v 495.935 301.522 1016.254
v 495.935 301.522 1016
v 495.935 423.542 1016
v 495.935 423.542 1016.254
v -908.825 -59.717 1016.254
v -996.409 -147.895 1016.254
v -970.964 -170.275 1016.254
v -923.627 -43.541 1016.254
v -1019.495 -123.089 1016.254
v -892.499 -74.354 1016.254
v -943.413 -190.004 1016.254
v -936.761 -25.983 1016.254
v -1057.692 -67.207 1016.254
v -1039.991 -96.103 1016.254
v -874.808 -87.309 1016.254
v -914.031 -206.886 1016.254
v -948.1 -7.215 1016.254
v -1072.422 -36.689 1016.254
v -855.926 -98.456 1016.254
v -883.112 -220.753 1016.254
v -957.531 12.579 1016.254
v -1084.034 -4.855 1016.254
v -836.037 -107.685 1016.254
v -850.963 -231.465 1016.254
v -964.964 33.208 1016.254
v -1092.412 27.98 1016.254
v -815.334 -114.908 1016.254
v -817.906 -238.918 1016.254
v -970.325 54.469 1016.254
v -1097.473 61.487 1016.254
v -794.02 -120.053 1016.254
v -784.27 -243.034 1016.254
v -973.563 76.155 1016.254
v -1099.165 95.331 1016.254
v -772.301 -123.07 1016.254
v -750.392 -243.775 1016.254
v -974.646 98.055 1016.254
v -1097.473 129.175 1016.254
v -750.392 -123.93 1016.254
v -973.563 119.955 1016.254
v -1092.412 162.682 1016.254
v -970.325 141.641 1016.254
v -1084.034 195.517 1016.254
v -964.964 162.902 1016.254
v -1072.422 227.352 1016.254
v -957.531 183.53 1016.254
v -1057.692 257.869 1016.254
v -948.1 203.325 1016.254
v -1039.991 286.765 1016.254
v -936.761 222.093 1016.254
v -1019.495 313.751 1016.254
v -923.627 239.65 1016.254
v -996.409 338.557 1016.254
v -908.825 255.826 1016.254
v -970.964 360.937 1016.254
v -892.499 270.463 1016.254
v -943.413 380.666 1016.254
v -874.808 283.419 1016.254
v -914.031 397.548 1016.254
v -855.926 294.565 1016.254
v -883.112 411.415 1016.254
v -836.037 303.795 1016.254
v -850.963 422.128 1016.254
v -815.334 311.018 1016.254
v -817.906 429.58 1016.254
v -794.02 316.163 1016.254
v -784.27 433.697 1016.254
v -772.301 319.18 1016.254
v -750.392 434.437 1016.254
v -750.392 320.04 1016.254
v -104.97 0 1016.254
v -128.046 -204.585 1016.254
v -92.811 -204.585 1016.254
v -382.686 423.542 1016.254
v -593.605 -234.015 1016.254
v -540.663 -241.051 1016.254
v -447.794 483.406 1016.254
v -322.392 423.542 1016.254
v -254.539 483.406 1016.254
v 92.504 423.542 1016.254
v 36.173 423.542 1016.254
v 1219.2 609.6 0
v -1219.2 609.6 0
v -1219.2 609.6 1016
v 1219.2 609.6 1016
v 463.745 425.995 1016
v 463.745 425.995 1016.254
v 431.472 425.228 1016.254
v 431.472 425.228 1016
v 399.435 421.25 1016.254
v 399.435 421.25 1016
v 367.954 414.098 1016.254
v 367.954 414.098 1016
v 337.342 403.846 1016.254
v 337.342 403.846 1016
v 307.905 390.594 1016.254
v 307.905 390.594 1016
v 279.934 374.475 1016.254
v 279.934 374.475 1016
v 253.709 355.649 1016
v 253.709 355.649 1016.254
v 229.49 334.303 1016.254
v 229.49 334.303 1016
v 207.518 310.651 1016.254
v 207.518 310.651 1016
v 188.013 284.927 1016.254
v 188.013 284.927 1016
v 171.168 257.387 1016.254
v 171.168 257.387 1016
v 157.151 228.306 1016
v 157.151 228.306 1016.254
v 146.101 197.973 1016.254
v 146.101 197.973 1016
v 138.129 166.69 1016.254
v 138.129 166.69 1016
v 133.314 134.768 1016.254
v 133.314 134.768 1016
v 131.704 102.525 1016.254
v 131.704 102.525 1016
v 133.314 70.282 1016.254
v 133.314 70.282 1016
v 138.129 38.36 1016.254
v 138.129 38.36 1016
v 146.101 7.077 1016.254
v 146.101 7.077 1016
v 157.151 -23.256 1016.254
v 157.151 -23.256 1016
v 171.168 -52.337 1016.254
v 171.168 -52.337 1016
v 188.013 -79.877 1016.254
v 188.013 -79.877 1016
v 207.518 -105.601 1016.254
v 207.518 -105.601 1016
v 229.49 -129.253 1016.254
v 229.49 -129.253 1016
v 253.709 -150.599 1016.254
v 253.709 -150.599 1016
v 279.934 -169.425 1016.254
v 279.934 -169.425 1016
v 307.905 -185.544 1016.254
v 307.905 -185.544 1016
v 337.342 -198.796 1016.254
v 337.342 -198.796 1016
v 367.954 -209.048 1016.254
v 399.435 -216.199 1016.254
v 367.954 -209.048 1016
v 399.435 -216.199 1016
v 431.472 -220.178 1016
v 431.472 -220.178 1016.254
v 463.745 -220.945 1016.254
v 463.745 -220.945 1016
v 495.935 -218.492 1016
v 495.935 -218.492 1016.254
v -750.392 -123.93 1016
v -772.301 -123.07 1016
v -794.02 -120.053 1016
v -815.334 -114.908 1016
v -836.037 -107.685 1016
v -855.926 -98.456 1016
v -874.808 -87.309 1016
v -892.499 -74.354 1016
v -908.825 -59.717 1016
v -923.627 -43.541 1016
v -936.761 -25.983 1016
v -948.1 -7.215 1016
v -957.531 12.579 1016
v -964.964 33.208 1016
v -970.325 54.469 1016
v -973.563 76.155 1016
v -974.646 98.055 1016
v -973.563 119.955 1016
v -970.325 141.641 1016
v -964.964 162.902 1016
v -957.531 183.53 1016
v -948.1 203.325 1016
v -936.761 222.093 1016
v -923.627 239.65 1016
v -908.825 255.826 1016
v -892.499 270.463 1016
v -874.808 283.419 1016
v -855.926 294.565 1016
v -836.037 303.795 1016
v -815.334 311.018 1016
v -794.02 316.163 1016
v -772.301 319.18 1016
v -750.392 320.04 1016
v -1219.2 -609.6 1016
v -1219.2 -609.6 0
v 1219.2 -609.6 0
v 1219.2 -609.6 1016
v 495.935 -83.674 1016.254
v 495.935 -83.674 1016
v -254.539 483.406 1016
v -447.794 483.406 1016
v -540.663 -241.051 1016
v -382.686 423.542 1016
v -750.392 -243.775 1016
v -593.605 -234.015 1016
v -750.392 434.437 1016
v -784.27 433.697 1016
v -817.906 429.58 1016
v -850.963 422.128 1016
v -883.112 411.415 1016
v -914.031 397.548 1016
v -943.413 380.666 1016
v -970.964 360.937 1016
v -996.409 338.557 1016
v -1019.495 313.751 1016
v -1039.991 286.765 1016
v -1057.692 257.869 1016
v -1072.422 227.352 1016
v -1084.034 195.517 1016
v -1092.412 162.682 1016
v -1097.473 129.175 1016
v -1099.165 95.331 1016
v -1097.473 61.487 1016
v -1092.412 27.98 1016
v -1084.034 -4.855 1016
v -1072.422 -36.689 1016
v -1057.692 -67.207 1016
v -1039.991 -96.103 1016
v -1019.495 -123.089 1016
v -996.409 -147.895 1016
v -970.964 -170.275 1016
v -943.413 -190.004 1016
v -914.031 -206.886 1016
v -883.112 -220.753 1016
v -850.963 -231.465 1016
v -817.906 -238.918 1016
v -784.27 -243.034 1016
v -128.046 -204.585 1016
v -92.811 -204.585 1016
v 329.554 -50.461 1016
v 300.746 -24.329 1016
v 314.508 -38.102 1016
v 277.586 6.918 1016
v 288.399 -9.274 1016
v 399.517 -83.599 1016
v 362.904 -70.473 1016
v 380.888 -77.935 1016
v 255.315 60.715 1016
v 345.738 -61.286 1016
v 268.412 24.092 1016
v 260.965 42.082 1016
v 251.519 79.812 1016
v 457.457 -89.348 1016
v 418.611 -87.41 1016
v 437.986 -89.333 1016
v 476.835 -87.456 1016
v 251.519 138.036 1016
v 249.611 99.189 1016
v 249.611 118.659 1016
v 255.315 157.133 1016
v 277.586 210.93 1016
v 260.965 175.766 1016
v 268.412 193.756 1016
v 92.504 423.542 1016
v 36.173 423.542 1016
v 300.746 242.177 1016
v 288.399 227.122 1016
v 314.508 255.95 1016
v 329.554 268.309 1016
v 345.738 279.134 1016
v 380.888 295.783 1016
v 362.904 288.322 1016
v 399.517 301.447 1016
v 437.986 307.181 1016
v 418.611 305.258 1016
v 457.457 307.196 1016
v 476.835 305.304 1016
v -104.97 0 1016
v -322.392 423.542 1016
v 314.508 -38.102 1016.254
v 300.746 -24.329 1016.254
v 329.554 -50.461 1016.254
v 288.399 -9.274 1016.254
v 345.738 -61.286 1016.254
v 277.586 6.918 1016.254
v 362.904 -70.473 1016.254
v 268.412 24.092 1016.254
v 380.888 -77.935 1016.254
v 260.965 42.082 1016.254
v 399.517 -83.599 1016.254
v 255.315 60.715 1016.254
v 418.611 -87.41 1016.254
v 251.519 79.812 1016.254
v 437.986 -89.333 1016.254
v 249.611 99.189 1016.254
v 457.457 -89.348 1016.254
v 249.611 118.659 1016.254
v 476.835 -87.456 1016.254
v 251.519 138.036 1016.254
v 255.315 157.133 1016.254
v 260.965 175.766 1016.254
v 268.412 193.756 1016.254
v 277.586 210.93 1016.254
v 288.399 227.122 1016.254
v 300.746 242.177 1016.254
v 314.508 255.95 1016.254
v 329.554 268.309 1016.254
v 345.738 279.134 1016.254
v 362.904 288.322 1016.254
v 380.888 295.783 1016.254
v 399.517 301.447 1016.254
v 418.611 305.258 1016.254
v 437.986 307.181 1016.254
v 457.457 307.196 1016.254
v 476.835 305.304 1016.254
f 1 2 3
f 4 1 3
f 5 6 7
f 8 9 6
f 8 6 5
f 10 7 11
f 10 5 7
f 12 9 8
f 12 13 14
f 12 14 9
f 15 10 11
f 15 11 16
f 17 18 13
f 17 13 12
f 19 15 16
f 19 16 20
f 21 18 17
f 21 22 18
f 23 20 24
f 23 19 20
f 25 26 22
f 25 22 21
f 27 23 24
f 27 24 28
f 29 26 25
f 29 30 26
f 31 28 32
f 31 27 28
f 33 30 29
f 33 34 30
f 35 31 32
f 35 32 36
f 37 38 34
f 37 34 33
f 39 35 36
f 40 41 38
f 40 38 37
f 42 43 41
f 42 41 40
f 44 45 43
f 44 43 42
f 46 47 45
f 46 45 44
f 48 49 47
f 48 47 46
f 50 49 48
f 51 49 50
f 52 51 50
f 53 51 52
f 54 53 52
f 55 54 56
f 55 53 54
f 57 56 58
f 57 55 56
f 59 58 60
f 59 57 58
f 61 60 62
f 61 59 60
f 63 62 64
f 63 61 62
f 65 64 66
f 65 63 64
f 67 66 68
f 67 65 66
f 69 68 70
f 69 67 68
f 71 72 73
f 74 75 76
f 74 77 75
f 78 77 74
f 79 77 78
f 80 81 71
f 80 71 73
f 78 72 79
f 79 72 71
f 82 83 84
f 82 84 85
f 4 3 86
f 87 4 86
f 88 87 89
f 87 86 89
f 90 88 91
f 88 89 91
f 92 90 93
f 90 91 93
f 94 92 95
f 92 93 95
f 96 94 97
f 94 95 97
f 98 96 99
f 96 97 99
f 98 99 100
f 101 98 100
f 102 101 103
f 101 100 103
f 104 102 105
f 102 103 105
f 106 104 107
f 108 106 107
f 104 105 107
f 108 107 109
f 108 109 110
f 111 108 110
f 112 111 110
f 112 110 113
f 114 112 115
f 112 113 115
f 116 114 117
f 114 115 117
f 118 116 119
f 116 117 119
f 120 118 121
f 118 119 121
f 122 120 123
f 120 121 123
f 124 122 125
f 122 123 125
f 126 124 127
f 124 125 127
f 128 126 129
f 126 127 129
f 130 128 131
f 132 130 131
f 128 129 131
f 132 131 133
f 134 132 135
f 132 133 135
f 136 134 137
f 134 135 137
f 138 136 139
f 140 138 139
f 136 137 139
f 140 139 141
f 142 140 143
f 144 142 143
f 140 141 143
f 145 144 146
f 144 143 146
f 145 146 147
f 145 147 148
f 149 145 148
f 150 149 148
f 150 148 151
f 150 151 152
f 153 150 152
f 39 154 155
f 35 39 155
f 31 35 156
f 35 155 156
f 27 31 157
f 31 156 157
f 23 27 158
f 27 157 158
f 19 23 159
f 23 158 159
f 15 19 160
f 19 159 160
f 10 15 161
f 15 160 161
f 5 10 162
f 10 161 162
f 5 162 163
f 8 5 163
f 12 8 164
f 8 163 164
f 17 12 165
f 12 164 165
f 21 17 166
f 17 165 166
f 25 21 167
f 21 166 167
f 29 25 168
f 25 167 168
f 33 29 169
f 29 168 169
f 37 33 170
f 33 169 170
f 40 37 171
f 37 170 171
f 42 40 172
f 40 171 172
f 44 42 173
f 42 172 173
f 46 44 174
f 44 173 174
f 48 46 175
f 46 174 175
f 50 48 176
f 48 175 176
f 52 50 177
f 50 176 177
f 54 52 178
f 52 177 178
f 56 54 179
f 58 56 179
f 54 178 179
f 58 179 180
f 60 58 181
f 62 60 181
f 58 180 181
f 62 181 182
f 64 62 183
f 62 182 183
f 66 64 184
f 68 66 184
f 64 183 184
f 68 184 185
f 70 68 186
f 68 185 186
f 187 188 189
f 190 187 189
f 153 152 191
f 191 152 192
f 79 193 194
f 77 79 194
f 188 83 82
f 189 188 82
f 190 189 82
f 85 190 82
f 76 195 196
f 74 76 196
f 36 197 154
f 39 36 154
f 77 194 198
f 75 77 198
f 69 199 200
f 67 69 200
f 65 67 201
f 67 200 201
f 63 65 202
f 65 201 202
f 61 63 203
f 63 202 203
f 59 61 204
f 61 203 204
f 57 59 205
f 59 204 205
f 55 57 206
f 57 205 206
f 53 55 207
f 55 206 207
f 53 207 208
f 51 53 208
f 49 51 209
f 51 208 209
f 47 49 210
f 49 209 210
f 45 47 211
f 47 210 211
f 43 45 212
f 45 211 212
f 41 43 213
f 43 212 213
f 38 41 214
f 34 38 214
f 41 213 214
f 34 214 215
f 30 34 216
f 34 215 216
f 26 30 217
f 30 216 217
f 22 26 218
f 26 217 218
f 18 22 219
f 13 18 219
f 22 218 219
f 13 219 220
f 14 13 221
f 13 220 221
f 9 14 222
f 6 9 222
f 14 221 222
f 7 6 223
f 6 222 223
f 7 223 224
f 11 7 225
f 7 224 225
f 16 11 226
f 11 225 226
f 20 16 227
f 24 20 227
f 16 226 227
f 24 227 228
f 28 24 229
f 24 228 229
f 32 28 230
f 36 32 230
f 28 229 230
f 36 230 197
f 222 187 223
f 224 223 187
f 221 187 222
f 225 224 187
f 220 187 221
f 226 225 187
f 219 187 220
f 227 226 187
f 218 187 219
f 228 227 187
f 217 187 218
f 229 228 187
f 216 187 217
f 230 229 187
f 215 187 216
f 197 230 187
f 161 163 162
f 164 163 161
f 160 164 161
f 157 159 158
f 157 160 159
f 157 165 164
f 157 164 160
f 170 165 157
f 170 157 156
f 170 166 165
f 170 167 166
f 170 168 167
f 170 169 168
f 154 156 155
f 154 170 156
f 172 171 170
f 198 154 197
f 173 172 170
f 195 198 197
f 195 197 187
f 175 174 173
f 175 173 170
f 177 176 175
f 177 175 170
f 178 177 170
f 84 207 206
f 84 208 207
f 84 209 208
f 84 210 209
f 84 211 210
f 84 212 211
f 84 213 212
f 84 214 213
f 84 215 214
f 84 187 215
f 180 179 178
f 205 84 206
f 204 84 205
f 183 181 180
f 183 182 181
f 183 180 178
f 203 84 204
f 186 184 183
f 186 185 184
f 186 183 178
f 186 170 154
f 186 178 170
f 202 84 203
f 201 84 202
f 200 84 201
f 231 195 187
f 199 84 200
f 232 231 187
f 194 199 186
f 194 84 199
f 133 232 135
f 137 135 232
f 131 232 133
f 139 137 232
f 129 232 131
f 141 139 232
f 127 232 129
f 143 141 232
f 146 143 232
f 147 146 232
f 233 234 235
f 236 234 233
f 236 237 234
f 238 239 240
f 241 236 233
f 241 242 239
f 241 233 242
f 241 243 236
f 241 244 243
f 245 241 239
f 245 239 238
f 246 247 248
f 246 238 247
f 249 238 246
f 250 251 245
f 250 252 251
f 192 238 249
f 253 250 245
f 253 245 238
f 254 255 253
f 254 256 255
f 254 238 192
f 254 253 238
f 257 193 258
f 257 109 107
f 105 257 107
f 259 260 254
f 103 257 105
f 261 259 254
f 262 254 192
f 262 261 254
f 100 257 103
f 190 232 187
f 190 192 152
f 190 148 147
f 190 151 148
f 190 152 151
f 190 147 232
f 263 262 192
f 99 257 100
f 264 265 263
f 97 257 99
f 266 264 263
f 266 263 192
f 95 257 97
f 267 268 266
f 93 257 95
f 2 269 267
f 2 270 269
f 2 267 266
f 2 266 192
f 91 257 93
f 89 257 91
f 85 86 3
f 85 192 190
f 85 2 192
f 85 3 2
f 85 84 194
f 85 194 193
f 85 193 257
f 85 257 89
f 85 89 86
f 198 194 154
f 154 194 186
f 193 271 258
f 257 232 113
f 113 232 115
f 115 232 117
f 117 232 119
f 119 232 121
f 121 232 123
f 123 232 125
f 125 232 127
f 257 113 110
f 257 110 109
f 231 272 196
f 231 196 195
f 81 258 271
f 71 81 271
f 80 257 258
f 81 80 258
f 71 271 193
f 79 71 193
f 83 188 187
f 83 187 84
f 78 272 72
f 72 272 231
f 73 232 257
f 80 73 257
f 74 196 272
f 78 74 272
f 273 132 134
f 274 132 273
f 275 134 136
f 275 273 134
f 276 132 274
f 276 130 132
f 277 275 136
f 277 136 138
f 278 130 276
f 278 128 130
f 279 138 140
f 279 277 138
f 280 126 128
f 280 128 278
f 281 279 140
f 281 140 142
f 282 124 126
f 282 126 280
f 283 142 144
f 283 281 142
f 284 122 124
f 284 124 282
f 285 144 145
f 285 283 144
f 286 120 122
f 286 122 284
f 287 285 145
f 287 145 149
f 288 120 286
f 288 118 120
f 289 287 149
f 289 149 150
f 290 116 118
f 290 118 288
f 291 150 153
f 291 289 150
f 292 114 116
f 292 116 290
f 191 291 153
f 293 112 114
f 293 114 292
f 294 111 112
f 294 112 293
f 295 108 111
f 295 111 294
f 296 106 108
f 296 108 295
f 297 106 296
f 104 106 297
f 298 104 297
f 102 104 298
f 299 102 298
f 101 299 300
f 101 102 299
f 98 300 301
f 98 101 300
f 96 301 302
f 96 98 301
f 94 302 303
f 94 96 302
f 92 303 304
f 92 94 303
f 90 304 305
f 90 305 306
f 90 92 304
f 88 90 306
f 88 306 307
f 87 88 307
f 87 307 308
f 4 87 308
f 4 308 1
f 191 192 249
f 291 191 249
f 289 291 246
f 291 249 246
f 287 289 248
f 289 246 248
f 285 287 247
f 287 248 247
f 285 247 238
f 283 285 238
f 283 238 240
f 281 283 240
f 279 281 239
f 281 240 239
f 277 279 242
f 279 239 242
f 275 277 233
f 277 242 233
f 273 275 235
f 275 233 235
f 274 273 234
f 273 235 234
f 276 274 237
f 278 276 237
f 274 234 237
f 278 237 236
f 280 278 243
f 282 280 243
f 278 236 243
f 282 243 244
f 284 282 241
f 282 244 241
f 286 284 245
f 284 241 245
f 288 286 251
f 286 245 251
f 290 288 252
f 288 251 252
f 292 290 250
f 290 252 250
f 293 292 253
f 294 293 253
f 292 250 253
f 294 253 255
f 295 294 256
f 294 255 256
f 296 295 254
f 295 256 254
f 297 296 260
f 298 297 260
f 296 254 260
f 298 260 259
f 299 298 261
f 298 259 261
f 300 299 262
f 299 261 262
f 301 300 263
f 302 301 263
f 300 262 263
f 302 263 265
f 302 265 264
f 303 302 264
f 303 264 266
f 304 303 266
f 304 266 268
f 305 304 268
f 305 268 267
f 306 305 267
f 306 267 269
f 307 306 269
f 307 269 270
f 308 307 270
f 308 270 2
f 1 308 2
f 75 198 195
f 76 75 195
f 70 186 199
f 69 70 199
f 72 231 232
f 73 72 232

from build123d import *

# Parameters (mm, degrees)
F0_W     = 2438.4
F0_H     = 1219.2
F1_DEPTH = 1016
F3_DEPTH = 0.254


with BuildPart() as f1:
    # F0 (on Top) → F1 (new body)
    with BuildSketch(Plane.XY):
        Rectangle(F0_W, F0_H)
    extrude(amount=F1_DEPTH)

    # F2 (on face) → F3 (join)
    with BuildSketch(Plane.XY.offset(1016)):
        with BuildLine():
            Line((-750.391662, 320.040017), (-750.391662, 434.437275))
            ThreePointArc((-750.391662, 434.437275), (-1099.165018, 95.331065), (-750.391662, -243.775144))
            Line((-750.391662, -243.775144), (-750.391662, -123.930387))
            ThreePointArc((-750.391662, -123.930387), (-974.646189, 98.054815), (-750.391662, 320.040017))
        make_face()
        Polygon((-593.604756, -234.014689), (-540.663302, -241.051421), (-382.686138, 423.542291), (-322.392195, 423.542291), (-128.046423, -204.584762), (-92.811242, -204.584762), (92.504166, 423.542291), (36.172967, 423.542291), (-104.970291, 0), (-254.538697, 483.406254), (-447.794408, 483.406254), align=None)
        with BuildLine():
            Line((495.935023, 301.521927), (495.935023, 423.542291))
            ThreePointArc((495.935023, 423.542291), (131.703868, 102.525033), (495.935023, -218.492225))
            Line((495.935023, -218.492225), (495.935023, -83.673745))
            ThreePointArc((495.935023, -83.673745), (249.372388, 108.924091), (495.935023, 301.521927))
        make_face()
    extrude(amount=F3_DEPTH)


solid = f1.part
